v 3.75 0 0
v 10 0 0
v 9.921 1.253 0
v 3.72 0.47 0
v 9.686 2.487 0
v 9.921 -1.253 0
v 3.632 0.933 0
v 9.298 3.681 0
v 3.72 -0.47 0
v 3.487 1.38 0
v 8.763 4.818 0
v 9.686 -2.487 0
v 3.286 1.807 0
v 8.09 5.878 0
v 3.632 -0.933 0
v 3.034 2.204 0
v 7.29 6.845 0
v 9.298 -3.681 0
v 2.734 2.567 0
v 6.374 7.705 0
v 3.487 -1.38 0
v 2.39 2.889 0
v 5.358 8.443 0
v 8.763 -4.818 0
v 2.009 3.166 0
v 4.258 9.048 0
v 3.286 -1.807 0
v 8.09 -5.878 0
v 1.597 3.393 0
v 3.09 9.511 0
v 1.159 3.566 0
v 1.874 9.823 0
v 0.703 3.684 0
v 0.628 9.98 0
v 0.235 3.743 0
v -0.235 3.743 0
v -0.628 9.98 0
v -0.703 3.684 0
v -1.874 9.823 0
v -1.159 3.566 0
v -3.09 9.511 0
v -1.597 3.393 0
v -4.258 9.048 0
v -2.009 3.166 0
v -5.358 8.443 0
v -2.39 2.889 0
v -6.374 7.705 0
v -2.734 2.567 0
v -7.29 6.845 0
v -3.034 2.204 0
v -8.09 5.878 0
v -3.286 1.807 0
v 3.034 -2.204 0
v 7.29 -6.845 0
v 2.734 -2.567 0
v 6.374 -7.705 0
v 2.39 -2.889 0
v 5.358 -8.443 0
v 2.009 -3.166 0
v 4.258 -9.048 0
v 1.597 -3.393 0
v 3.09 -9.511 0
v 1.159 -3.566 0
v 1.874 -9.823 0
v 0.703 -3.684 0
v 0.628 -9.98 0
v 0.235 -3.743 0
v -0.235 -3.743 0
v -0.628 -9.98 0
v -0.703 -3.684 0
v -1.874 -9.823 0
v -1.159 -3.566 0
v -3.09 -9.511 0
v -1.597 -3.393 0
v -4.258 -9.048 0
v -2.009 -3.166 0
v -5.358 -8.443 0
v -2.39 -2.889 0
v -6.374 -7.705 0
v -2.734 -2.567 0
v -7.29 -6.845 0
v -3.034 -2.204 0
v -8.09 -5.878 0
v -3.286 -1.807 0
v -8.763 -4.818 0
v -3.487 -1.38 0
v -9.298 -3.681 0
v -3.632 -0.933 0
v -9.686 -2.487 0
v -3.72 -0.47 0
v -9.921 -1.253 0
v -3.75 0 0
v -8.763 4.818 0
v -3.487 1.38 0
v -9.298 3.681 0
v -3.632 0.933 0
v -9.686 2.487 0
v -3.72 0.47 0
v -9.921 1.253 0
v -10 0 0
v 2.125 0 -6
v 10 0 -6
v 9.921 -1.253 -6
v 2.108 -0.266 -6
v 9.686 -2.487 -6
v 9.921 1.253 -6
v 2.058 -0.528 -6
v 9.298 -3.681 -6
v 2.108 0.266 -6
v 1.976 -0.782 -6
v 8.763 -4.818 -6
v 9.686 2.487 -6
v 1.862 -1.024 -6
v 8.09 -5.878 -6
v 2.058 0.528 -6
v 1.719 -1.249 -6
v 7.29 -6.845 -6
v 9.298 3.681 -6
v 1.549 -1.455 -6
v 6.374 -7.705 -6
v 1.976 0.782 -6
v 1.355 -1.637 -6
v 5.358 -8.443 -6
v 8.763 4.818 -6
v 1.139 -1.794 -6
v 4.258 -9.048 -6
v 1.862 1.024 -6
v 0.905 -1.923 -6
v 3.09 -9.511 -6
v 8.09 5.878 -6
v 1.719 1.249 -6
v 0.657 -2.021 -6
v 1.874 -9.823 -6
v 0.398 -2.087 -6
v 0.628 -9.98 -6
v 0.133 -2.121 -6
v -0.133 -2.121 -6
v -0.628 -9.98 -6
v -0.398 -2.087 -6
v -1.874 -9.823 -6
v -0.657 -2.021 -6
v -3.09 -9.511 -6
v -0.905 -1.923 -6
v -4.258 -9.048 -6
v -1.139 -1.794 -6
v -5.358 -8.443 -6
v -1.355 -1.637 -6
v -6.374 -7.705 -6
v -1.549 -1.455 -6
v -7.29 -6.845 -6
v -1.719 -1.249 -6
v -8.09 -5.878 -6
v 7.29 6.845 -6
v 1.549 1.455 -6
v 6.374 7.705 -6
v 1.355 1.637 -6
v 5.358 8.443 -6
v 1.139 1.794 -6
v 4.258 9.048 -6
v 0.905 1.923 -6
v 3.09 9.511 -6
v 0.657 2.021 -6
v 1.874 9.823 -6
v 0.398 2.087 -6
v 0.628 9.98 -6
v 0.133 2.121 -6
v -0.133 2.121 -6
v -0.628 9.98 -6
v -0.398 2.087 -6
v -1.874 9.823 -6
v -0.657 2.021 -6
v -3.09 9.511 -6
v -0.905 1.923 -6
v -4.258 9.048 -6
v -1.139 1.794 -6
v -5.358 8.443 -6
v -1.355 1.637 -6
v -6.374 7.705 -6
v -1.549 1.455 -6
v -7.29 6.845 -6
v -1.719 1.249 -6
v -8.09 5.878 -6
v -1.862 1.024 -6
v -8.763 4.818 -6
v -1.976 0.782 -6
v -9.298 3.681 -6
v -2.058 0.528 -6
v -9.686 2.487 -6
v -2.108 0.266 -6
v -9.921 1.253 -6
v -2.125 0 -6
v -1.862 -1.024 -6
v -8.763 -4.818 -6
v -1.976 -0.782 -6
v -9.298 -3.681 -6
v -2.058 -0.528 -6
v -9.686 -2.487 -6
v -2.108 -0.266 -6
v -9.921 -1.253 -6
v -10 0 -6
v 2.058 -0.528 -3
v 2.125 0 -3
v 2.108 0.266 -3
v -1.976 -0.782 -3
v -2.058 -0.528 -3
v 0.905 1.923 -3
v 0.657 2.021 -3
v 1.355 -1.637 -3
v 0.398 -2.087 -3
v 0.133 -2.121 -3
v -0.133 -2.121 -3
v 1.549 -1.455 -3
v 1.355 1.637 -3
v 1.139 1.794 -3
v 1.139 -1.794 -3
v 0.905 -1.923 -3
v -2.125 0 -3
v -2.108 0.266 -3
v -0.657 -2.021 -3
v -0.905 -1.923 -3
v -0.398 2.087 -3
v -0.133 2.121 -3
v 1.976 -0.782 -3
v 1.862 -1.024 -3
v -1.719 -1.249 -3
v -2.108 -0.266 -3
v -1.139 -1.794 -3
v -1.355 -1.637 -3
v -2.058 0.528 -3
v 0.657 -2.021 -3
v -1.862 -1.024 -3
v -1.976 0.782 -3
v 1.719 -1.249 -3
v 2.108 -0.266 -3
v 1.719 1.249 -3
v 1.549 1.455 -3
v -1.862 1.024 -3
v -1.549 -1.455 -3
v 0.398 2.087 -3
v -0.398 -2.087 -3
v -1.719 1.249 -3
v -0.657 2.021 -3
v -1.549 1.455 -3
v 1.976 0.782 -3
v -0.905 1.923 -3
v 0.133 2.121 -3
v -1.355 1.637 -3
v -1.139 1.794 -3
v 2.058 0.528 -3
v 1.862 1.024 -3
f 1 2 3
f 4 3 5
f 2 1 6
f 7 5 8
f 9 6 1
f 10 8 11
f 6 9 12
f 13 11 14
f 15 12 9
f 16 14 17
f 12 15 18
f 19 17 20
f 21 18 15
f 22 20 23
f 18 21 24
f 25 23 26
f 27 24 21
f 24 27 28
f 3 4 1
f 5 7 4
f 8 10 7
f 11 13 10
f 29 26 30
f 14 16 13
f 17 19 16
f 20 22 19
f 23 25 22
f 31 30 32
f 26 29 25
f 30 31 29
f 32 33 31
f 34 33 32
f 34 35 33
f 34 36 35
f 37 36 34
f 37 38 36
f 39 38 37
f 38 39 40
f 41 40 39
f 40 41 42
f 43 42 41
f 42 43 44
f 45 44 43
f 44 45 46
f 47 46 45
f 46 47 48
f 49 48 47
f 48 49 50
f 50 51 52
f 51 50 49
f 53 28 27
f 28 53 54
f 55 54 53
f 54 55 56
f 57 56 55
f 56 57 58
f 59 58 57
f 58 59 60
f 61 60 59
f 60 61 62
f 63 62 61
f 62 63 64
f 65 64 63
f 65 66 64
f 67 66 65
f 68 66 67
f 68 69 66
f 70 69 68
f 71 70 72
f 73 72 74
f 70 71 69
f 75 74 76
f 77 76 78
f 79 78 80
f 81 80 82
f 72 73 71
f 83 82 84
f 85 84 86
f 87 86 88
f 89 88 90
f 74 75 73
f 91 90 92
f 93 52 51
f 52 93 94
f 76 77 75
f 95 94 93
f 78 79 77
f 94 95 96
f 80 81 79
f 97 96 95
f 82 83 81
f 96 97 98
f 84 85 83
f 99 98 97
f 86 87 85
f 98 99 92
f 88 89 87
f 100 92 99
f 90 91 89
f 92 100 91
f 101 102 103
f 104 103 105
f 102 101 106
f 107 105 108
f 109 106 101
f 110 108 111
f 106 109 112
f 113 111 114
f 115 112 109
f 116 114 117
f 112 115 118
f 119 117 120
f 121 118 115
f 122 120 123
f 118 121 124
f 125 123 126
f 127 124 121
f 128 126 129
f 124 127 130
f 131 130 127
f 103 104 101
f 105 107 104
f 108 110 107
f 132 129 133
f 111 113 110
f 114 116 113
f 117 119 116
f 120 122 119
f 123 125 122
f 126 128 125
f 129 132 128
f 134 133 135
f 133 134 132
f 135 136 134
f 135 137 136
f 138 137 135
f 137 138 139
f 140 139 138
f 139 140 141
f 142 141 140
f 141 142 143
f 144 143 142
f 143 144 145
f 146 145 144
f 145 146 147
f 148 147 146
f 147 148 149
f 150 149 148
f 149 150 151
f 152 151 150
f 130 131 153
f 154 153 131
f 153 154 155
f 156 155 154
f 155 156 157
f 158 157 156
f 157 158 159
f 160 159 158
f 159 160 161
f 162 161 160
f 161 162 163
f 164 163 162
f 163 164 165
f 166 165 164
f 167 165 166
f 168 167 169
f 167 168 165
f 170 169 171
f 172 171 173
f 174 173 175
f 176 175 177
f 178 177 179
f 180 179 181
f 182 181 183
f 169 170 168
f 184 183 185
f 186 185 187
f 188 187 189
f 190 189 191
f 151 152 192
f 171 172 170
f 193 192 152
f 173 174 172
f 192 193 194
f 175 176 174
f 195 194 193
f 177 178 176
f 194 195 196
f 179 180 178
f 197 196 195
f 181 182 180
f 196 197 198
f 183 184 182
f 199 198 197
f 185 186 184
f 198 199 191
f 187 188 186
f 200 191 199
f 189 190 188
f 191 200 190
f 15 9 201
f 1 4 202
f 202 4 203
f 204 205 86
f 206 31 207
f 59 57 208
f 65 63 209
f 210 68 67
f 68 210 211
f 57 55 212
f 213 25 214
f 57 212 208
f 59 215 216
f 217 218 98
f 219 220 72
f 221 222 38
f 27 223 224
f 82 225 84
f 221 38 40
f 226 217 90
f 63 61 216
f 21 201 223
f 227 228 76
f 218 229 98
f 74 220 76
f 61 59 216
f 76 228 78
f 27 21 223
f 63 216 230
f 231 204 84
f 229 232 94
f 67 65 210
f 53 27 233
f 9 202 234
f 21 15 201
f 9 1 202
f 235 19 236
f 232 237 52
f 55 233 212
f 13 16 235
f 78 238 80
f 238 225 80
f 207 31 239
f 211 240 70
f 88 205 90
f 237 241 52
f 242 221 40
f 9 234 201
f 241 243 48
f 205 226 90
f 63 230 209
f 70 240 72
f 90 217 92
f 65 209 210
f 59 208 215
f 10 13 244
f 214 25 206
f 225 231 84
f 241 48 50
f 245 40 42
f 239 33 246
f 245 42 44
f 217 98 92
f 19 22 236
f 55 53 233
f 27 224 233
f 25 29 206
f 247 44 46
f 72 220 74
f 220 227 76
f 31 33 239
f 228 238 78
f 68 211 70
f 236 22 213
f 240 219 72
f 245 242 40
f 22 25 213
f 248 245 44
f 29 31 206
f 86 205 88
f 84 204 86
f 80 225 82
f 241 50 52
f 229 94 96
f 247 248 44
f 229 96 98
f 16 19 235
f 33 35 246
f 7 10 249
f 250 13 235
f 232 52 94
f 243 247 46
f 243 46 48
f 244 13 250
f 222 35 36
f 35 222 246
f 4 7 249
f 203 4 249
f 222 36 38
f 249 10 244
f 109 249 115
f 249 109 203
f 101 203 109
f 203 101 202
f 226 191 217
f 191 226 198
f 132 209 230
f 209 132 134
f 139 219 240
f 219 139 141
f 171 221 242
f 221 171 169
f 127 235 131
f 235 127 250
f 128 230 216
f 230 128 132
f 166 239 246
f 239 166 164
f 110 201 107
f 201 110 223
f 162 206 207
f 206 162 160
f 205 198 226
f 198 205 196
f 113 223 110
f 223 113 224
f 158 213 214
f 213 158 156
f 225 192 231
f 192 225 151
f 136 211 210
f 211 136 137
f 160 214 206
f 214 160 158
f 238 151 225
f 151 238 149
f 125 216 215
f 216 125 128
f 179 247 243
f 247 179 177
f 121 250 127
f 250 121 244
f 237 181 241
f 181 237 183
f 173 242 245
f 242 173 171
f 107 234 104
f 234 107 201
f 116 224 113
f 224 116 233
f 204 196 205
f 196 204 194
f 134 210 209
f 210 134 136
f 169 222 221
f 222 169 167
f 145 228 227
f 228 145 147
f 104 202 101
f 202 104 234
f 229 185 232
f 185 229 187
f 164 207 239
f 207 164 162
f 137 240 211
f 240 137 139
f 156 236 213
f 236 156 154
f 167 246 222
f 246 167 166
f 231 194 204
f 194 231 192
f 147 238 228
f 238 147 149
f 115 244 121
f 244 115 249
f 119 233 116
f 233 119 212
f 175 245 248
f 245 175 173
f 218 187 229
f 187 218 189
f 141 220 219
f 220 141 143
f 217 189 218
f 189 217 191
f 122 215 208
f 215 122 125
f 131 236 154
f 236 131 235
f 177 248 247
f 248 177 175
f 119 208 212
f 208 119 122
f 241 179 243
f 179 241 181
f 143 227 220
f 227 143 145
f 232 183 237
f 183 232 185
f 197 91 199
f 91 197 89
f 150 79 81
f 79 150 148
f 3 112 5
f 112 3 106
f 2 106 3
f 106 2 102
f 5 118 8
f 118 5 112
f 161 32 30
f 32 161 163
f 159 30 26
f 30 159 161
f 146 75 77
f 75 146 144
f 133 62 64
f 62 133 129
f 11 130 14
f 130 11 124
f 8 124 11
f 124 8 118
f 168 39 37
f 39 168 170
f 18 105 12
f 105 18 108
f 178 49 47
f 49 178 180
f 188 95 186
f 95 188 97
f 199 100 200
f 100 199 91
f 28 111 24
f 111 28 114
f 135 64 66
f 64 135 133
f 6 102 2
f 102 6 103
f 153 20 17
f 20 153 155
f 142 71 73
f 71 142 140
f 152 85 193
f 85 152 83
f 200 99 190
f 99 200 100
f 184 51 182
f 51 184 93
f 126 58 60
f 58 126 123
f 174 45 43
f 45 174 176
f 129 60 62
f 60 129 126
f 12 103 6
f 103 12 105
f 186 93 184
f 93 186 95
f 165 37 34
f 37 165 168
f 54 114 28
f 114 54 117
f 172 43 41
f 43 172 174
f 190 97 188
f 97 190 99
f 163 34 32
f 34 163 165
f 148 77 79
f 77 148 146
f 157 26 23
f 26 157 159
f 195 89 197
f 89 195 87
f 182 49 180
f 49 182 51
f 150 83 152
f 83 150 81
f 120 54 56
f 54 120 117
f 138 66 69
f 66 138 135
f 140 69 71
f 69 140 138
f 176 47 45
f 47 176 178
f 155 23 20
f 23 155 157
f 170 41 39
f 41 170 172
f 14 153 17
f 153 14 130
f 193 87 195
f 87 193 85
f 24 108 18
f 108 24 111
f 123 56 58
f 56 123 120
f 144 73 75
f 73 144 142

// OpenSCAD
$fn = 50;


difference() {
	union() {
		translate(v = [0, 0, -6.0000000000]) {
			cylinder(h = 6, r = 10.0000000000);
		}
	}
	union() {
		translate(v = [0, 0, 0]) {
			rotate(a = [0, 0, 0]) {
				difference() {
					union() {
						#translate(v = [0, 0, -6.0000000000]) {
							cylinder(h = 6, r = 2.0000000000);
						}
						#translate(v = [0, 0, -3]) {
							cylinder(h = 3, r = 10.0000000000, r1 = 2.1250000000, r2 = 3.7500000000);
						}
						#translate(v = [0, 0, -6.0000000000]) {
							cylinder(h = 6, r = 2.1250000000);
						}
						#translate(v = [0, 0, -6.0000000000]) {
							cylinder(h = 6, r = 2.0000000000);
						}
					}
					union();
				}
			}
		}
	}
}
